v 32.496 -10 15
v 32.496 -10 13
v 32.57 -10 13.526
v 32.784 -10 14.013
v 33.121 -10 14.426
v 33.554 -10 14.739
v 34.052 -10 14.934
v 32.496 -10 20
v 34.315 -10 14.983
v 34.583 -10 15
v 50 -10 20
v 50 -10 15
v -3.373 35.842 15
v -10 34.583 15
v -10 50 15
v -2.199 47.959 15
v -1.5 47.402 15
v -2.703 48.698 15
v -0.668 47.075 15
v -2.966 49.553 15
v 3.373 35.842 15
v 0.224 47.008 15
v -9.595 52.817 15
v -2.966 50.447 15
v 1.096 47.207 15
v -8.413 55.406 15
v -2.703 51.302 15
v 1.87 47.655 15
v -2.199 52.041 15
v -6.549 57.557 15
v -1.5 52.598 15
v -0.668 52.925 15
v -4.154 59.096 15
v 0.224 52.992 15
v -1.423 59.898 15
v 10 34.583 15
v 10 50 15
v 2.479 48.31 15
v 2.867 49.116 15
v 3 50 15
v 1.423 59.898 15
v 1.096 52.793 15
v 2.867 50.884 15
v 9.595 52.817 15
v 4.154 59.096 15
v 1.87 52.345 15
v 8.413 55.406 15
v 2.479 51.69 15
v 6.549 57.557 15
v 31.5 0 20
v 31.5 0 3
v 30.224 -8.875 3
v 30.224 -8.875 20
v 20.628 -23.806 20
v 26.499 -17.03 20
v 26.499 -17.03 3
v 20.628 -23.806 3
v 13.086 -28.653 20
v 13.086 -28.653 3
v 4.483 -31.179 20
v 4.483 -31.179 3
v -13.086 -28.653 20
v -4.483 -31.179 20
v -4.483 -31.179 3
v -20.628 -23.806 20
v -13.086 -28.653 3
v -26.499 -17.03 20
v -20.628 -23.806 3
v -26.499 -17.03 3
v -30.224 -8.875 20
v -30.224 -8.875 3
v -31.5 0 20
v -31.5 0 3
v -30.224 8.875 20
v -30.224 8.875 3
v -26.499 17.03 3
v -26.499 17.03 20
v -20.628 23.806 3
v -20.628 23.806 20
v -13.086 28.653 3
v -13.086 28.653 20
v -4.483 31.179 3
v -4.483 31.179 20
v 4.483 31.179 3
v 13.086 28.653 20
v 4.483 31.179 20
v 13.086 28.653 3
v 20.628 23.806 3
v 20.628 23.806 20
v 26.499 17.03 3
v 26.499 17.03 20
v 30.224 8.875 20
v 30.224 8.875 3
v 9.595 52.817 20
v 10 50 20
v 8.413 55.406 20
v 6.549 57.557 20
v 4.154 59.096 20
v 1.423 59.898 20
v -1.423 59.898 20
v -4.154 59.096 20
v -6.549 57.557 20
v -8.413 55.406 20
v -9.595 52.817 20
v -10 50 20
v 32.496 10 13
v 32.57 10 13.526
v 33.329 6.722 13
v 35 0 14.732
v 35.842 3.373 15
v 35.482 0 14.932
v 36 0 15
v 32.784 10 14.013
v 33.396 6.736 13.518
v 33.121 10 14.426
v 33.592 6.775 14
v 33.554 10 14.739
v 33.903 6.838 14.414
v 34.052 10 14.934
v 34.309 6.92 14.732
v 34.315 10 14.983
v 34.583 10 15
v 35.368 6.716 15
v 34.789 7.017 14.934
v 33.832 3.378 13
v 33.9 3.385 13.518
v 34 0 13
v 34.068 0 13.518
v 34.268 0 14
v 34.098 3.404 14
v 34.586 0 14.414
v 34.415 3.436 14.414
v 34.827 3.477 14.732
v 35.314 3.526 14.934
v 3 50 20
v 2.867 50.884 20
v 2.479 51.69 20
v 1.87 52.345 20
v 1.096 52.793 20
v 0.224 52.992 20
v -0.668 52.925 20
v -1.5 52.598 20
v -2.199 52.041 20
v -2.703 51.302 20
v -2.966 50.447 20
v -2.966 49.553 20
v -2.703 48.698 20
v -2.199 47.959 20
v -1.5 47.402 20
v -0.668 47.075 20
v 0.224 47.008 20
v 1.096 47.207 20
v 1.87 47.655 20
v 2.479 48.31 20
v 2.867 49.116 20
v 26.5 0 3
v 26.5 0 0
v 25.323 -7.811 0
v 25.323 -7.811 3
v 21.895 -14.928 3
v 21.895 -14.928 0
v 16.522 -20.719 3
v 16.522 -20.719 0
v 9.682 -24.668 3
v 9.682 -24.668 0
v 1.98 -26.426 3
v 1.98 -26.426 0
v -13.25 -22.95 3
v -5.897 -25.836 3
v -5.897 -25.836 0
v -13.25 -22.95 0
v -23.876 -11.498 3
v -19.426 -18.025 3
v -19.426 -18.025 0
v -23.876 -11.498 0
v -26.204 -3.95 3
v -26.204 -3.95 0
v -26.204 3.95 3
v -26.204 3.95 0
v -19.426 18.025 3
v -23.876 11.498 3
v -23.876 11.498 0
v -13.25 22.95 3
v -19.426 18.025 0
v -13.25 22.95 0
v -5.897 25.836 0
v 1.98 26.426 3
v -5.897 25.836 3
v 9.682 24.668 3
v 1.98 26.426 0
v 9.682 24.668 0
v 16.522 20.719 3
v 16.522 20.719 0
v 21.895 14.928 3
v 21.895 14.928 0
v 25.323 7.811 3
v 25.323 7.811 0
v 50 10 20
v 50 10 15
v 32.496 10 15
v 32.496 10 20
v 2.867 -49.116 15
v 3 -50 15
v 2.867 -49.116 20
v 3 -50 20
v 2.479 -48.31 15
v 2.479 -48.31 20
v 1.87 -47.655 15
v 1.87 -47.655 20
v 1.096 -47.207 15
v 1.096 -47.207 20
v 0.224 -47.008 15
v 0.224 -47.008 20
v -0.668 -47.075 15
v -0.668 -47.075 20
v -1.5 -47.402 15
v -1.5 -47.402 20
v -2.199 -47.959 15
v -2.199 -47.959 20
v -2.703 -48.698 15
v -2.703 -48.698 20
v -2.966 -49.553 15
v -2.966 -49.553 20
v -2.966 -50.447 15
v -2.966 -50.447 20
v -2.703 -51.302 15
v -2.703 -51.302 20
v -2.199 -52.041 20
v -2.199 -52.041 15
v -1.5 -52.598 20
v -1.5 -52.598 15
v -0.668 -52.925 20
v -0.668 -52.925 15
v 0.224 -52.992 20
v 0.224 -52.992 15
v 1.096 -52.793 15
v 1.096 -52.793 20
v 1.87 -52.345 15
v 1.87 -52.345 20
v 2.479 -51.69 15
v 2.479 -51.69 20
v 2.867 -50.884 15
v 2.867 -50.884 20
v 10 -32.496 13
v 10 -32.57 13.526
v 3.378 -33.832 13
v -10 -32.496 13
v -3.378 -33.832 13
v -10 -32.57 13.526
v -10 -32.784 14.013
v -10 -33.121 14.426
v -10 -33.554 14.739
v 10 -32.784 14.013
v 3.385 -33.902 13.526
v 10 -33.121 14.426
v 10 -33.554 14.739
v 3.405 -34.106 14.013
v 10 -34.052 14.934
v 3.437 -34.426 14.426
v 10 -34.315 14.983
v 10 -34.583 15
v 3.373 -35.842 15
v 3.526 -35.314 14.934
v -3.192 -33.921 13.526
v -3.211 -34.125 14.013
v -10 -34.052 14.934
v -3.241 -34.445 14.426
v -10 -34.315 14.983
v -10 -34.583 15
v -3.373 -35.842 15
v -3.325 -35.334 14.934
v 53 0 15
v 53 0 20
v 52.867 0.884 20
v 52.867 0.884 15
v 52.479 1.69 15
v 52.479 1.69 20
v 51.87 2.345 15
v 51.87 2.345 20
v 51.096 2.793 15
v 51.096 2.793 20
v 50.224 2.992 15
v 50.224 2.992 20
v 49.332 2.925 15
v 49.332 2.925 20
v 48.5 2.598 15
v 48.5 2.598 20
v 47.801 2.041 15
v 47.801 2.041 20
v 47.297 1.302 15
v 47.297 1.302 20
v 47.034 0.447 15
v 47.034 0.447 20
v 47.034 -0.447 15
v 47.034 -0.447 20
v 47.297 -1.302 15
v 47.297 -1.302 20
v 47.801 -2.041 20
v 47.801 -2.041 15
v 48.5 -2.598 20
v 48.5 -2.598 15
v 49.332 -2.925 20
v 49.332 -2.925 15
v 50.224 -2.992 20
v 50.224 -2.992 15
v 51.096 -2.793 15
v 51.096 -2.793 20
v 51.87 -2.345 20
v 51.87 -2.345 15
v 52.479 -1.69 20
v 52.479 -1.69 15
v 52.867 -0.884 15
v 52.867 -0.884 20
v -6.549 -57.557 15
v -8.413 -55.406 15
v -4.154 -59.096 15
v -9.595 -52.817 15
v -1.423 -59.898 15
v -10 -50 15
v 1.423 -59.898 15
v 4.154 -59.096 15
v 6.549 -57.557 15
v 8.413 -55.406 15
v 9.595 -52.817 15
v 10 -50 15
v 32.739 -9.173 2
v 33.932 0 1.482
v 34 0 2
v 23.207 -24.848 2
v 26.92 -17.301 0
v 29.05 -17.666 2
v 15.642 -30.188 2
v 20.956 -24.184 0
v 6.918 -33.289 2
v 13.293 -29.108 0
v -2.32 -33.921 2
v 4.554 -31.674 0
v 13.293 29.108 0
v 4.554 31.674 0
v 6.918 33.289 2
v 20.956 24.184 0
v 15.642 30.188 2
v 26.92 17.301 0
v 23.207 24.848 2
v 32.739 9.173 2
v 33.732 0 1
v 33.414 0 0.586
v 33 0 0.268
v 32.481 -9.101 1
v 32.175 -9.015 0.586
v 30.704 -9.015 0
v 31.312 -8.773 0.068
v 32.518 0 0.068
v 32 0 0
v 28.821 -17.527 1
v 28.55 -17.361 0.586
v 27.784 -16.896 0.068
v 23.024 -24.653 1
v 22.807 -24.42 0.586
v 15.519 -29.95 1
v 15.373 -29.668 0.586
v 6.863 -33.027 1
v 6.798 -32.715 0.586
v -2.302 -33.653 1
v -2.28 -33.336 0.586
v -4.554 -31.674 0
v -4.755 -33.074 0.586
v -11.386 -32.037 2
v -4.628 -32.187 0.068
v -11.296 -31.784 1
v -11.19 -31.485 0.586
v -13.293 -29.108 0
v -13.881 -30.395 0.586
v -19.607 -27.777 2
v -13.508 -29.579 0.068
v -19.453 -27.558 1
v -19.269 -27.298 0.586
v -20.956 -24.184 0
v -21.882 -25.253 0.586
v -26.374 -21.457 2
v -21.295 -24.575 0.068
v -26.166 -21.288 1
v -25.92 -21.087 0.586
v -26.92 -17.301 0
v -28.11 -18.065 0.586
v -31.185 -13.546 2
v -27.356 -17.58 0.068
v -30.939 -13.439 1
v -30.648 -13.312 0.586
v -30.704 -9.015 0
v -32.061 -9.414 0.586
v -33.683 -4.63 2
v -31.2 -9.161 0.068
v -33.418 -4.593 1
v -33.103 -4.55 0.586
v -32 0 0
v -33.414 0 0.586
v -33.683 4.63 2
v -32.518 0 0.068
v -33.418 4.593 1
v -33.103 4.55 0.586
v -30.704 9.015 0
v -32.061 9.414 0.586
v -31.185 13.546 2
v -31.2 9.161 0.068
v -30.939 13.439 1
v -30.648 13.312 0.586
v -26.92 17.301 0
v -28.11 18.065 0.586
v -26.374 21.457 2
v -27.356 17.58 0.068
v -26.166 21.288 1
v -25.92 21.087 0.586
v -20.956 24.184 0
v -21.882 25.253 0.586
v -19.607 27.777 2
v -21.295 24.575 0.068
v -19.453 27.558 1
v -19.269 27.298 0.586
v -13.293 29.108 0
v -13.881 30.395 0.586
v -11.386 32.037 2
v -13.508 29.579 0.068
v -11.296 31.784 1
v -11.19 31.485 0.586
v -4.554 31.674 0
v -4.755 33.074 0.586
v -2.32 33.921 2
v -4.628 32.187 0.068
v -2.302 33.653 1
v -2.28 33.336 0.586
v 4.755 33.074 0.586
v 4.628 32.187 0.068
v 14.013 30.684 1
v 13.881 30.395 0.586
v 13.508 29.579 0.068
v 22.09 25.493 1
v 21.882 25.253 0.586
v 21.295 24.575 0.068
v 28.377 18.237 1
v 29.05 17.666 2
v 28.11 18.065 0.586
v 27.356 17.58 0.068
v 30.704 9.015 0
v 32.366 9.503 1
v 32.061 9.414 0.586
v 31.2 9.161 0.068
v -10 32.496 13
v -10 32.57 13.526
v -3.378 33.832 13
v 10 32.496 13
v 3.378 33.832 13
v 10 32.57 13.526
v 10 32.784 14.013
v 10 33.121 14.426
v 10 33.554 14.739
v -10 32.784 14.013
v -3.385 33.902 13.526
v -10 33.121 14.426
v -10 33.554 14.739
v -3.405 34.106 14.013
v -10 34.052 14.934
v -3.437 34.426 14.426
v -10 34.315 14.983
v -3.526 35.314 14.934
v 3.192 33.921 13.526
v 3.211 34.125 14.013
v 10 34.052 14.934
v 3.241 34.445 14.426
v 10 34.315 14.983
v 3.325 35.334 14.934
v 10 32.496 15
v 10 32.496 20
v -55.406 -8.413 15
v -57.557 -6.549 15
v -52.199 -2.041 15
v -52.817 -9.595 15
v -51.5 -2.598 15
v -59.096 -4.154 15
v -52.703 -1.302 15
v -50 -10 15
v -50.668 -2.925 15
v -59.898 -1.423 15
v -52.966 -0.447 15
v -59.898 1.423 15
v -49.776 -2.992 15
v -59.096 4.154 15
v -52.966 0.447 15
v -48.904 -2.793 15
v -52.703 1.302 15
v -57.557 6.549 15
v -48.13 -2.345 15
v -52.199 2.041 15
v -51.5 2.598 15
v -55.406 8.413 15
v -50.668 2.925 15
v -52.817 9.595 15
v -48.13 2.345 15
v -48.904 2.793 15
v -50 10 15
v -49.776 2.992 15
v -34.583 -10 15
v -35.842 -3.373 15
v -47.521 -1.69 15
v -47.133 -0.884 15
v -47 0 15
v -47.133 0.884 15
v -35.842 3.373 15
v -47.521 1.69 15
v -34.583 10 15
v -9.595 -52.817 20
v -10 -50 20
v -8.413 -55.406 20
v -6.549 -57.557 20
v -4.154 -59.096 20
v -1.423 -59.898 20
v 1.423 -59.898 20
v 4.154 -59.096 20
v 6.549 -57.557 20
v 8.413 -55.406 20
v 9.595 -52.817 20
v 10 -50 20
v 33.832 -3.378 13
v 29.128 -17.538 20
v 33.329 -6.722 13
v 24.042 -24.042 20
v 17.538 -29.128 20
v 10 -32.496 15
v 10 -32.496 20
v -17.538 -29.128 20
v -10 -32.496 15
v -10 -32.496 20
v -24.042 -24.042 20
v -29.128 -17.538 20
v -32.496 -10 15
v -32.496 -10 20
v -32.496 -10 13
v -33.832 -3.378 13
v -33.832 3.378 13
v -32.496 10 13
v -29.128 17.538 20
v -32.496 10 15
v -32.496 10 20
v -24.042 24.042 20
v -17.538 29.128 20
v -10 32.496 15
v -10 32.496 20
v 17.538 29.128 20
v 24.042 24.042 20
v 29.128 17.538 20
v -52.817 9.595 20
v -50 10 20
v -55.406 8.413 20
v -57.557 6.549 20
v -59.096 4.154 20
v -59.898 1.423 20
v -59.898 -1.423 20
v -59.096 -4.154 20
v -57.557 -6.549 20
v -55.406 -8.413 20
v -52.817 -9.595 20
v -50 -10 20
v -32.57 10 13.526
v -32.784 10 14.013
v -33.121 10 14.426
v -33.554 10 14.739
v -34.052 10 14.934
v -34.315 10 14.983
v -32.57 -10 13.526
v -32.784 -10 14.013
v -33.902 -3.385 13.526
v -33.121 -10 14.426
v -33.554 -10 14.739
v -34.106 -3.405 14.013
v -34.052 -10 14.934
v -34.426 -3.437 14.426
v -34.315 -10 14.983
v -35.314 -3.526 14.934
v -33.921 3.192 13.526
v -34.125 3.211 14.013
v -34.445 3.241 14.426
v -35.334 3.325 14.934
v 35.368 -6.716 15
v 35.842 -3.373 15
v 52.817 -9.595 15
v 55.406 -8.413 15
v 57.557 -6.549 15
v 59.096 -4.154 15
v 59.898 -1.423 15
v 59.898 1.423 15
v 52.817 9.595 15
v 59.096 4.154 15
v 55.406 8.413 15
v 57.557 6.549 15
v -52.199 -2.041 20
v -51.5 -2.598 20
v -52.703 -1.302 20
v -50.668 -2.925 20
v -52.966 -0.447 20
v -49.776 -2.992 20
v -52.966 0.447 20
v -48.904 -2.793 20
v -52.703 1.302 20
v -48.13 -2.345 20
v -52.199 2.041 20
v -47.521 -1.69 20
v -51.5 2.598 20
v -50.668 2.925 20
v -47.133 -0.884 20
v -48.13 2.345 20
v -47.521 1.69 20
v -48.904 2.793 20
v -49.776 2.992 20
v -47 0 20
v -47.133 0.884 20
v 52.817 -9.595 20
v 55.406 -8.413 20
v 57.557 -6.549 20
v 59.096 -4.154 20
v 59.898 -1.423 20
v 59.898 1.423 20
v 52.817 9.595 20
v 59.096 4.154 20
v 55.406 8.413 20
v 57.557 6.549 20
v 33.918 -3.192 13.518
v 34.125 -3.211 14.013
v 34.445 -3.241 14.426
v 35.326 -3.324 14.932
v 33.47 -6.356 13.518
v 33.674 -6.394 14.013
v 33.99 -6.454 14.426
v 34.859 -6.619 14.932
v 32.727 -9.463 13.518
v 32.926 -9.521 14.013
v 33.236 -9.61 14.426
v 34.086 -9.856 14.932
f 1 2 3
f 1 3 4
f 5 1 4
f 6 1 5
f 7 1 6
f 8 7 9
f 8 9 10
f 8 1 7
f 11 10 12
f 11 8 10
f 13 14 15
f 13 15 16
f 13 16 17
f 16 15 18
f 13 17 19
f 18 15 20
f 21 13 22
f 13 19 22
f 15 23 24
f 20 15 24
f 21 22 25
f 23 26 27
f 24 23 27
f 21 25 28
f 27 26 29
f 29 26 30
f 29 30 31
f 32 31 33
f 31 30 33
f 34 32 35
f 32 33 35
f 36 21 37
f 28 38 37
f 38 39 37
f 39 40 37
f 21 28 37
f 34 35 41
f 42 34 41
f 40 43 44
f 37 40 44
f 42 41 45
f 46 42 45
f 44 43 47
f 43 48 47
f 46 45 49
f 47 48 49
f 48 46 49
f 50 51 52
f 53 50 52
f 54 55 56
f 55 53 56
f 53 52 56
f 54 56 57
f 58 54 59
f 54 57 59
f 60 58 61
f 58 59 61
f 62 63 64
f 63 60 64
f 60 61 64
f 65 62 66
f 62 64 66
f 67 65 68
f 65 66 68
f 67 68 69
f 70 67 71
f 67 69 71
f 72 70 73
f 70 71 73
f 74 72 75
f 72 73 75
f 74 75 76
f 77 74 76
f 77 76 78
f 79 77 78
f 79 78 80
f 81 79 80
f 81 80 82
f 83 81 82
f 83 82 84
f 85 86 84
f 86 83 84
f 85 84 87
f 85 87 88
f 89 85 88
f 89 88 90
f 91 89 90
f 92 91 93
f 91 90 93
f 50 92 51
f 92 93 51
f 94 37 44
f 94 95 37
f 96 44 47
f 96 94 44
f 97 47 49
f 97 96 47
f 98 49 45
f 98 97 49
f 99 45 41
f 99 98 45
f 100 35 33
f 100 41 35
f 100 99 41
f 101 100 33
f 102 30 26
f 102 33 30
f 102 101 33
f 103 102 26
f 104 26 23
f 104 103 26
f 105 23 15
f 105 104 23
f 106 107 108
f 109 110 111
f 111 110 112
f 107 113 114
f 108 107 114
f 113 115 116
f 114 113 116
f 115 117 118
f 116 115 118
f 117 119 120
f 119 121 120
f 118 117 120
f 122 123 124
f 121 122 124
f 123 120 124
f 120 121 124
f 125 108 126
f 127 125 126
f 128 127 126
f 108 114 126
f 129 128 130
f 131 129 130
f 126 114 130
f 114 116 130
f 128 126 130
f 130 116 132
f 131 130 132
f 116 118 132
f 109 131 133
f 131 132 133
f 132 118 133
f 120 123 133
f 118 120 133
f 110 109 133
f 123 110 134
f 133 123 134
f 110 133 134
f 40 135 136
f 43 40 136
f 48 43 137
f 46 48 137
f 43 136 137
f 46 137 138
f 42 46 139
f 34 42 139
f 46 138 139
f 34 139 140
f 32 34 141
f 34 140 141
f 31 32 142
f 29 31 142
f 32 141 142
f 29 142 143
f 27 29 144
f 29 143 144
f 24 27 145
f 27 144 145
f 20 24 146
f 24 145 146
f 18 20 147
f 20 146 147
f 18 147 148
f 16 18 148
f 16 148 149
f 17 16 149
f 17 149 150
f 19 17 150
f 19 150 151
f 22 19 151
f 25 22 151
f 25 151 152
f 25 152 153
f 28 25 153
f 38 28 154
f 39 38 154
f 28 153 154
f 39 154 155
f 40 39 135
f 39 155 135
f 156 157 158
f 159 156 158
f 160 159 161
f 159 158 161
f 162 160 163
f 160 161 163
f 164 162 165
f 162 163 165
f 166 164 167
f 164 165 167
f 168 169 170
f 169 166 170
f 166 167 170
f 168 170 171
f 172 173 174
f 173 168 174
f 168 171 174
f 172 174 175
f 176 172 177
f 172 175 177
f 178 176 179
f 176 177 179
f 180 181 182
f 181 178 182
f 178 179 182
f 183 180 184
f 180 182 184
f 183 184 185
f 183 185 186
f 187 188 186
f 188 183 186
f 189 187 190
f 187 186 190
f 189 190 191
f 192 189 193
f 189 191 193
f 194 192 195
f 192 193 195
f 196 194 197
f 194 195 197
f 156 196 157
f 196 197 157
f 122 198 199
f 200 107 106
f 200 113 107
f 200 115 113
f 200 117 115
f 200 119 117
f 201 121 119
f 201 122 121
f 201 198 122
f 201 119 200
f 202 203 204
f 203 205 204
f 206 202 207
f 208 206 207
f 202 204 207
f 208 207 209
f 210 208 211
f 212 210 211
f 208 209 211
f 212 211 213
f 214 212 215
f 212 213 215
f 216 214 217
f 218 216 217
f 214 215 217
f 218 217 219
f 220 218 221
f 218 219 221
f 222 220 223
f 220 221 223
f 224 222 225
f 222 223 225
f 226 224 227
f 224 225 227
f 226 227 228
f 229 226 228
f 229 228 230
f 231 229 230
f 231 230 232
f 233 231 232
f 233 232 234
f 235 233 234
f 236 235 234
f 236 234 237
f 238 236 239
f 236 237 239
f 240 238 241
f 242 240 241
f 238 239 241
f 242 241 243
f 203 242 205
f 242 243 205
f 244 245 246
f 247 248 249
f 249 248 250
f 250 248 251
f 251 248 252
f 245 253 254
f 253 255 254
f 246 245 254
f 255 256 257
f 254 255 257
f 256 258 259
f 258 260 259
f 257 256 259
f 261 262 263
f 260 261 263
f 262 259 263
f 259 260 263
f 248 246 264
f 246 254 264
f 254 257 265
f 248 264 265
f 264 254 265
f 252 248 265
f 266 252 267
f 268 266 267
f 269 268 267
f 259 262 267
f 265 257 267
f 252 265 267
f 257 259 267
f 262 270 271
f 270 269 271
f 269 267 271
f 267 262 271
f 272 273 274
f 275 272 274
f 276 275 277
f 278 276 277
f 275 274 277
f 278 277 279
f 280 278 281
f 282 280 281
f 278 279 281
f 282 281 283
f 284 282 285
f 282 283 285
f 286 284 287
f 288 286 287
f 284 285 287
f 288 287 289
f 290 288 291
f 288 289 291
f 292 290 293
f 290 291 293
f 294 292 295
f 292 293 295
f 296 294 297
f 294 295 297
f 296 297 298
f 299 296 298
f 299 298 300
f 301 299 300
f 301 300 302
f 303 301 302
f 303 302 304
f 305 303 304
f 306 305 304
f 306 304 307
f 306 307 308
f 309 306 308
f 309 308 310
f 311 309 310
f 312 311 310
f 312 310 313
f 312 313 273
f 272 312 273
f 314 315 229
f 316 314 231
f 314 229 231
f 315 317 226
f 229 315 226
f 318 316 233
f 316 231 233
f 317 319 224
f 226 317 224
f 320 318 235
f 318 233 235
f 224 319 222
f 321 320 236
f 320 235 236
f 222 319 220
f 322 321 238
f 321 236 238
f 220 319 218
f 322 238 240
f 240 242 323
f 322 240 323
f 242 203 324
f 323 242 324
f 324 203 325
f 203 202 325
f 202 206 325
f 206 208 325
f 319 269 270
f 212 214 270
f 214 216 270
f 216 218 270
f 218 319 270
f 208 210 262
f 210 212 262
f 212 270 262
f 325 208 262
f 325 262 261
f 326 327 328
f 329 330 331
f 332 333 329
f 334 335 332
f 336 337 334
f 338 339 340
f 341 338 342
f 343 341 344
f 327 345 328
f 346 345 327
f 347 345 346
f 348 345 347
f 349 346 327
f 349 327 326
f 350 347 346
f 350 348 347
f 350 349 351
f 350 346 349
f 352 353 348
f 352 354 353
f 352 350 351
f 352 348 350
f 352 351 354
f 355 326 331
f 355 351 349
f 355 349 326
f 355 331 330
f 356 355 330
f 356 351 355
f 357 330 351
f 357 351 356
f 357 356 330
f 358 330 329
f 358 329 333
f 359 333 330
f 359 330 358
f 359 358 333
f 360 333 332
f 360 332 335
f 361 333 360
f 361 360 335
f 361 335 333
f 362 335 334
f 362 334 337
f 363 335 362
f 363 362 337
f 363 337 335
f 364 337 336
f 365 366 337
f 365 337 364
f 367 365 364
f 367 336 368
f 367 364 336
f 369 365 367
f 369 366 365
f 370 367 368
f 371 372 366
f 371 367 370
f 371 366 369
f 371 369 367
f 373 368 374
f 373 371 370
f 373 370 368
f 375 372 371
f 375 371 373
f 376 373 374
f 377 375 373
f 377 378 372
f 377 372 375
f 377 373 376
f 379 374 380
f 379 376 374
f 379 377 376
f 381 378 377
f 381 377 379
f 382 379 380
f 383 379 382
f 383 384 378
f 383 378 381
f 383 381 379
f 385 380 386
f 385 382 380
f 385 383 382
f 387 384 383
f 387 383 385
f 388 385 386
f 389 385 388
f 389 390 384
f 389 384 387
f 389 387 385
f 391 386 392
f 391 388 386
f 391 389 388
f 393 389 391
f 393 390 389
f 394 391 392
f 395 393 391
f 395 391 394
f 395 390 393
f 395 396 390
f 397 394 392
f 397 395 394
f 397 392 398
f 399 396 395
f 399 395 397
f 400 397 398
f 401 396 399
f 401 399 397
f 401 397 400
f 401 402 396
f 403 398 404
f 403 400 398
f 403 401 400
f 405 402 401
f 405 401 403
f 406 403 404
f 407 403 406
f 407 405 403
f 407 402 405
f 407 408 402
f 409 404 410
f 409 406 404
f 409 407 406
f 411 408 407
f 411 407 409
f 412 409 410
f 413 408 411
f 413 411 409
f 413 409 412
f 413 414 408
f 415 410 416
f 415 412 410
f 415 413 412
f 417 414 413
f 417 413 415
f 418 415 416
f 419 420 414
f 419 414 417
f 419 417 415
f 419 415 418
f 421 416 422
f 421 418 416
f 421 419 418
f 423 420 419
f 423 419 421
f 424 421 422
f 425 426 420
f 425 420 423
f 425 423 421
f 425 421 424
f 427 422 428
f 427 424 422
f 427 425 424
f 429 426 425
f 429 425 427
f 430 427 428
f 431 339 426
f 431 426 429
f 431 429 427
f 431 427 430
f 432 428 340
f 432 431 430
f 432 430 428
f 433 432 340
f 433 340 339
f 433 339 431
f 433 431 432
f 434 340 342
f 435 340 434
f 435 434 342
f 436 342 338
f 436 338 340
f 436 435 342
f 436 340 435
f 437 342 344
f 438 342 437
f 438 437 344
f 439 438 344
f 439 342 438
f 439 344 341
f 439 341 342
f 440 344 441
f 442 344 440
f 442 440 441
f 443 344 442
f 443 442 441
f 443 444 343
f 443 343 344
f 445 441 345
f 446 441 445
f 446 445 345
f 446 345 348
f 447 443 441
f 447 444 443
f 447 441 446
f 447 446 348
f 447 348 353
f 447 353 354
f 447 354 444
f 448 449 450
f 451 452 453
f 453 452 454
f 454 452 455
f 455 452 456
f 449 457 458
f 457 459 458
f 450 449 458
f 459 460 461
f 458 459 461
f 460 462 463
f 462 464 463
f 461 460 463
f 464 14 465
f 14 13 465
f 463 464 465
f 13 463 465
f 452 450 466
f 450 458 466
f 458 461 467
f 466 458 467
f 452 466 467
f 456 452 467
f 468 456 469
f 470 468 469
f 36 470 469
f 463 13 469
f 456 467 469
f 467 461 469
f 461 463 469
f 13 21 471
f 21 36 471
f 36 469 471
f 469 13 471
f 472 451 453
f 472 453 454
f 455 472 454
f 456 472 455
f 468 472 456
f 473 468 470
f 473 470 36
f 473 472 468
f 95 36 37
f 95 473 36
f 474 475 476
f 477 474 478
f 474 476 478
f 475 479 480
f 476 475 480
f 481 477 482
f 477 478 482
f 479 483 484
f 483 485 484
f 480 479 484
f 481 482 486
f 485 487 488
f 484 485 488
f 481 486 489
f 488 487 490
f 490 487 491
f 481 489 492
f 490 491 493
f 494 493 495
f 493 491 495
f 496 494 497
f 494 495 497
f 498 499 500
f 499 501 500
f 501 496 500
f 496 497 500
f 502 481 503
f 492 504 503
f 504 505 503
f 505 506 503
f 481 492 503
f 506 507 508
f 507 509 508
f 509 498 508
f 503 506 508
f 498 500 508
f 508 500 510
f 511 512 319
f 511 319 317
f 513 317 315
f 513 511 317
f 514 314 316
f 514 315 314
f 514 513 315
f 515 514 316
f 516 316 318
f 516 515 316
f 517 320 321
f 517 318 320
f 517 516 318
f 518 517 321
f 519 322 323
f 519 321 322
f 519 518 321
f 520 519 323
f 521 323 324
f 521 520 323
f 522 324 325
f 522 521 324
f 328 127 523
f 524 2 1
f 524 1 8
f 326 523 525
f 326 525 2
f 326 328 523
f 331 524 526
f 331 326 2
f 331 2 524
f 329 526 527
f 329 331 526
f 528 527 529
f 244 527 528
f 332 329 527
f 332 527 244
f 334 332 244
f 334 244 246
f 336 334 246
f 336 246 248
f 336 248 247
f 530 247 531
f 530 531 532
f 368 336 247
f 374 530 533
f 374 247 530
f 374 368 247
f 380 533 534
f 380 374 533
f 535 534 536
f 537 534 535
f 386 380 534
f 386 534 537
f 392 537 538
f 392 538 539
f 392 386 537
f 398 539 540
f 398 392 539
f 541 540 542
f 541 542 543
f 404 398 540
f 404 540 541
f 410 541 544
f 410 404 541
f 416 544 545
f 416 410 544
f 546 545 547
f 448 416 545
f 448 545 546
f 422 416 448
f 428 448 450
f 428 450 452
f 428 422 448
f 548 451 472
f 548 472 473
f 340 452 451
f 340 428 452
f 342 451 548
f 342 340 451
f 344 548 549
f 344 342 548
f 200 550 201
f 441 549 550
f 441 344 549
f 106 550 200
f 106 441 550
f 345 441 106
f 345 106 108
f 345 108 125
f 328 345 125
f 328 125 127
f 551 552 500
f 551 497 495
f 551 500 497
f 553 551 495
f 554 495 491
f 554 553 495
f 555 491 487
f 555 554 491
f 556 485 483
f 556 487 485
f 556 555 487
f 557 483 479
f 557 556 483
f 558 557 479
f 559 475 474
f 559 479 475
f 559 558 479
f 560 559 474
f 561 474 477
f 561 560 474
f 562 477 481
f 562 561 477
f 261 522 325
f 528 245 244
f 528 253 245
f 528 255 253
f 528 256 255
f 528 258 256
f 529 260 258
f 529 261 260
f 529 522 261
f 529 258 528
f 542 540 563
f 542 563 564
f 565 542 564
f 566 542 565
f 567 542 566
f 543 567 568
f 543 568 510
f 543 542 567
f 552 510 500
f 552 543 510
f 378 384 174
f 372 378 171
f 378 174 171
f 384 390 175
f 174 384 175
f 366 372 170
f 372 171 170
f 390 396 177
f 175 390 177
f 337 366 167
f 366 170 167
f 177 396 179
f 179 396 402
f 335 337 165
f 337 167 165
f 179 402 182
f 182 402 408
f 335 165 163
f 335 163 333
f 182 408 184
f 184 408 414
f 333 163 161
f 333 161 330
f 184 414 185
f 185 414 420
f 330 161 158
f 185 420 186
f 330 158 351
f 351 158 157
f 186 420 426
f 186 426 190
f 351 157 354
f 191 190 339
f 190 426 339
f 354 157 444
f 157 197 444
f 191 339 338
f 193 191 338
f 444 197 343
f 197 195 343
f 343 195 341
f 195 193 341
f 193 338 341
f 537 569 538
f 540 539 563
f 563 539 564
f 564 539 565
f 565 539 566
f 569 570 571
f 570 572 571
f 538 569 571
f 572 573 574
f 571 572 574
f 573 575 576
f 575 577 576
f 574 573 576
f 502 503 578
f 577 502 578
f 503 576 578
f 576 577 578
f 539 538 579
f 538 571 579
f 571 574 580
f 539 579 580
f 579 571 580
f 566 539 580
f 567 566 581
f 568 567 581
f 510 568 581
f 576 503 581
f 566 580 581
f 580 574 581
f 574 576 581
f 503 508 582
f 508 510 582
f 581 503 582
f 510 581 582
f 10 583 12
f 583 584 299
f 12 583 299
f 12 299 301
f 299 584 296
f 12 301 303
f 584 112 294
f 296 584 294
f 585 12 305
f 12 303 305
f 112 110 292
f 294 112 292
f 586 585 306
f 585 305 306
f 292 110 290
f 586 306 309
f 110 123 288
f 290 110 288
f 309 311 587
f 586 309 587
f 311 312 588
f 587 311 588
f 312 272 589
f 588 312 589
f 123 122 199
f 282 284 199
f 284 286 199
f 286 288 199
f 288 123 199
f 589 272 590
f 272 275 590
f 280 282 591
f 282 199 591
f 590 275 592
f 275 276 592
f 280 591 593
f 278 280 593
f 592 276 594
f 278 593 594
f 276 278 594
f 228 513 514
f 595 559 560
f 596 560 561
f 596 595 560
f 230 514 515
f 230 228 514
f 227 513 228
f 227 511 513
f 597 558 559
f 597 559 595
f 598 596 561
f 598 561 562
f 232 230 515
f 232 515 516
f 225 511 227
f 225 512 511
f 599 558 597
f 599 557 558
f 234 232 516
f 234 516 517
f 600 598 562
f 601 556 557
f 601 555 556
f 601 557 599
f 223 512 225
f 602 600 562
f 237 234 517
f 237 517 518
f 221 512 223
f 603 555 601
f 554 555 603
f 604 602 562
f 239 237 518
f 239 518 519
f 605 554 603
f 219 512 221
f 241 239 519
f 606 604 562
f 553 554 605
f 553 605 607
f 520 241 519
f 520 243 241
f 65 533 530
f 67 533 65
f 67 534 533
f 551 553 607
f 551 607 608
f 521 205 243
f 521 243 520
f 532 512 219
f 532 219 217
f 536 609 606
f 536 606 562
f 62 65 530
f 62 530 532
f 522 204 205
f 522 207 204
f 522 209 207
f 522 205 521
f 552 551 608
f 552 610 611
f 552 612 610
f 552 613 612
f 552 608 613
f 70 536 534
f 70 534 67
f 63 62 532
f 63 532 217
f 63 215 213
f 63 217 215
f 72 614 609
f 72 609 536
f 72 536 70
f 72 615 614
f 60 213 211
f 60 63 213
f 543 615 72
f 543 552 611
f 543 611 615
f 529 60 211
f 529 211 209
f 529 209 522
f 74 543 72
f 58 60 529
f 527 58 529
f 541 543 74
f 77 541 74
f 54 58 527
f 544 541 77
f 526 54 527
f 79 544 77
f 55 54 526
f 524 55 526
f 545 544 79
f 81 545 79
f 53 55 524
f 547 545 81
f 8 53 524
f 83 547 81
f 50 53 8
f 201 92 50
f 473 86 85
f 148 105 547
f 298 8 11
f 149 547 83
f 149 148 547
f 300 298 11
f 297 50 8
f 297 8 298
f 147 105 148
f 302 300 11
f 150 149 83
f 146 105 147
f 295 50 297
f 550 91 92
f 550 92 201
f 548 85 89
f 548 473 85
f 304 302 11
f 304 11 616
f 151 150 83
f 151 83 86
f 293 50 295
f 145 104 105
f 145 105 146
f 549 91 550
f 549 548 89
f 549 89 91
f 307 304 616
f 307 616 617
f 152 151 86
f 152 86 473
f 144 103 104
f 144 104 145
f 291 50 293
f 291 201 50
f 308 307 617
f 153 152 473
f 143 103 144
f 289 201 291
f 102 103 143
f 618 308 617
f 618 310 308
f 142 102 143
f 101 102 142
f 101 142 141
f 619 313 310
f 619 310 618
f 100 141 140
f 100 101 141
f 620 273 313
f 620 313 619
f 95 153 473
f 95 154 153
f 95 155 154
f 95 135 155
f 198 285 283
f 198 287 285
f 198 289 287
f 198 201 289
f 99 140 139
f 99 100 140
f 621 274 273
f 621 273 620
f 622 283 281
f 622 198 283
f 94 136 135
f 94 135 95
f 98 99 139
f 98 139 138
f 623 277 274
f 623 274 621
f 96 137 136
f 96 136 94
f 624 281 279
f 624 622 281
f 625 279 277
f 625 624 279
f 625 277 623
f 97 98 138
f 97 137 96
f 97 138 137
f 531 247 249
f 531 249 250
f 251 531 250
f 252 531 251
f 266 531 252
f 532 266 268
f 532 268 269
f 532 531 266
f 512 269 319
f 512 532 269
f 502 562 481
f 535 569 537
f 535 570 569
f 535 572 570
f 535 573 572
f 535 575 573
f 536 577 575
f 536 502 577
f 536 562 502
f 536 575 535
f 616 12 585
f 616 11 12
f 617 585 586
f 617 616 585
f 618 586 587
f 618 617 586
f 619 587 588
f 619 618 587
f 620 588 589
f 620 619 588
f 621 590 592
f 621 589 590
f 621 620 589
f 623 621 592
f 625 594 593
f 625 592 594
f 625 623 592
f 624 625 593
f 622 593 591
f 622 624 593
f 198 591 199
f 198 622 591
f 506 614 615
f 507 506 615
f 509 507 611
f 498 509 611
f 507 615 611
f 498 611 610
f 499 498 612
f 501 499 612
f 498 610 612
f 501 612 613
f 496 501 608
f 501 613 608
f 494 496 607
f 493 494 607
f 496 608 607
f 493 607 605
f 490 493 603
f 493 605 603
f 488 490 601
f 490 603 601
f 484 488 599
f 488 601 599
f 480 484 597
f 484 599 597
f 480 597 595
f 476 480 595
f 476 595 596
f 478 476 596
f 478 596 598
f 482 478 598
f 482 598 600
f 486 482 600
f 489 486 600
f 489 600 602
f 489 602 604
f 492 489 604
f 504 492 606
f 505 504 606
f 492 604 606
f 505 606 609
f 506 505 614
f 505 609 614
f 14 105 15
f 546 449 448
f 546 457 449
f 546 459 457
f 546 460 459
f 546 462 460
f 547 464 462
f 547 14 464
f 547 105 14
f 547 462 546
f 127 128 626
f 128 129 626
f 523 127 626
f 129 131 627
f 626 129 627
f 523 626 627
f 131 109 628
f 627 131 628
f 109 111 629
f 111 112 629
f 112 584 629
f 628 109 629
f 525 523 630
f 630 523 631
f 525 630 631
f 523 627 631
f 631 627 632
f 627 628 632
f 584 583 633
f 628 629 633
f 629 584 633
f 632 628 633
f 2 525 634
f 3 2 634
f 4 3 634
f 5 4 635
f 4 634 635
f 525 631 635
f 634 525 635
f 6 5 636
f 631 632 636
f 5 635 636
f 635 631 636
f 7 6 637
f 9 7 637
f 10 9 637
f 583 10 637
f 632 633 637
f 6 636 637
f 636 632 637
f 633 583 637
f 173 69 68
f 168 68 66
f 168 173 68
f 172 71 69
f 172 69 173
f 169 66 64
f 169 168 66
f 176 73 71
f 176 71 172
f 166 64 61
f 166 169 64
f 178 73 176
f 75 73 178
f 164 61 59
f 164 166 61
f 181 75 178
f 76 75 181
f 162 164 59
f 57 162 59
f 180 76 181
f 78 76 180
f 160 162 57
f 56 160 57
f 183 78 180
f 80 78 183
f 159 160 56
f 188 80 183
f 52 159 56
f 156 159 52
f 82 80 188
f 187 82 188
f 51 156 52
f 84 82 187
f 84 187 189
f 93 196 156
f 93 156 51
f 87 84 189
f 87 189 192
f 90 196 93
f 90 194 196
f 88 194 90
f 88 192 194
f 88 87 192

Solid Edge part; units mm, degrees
sketch "Sketch1" plane through (0, 0, 0) normal (0, 0, 1) x (1, 0, 0)
  circle A0 centre (0, 0) radius 26.5
  circle A1 centre (0, 0) radius 34
extrude "Protrusion1" add sketch "Sketch1" along normal blind 3
sketch "Sketch2" plane through (0, 0, 3) normal (0, 0, 1) x (1, 0, 0)
  circle A0 centre (0, 0) radius 31.5
  circle A1 centre (0, 0) radius 34
extrude "ExtrudedProtrusion_2" add sketch "Sketch2" along normal blind 17
fillet "Round_1" radius 2 1 edges at (-34, 0, 0)
sketch "Sketch3" plane through (0, 0, 20) normal (0, 0, 1) x (1, 0, 0)
  line L0 (10, 32.4962) -> (10, 50)
  line L1 (-10, 50) -> (-10, 32.4962)
  arc A0 (-10, 32.4962) -> (10, 32.4962) centre (0, 0) cw
  arc A1 (-10, 50) -> (10, 50) centre (0, 50) cw
  circle A2 centre (0, 50) radius 3
  line L2 (50, 10) -> (32.4962, 10)
  arc A3 (32.4962, 10) -> (32.4962, -10) centre (0, 0) cw
  line L3 (32.4962, -10) -> (50, -10)
  arc A4 (50, 10) -> (50, -10) centre (50, 0) cw
  circle A5 centre (50, 0) radius 3
  circle A6 centre (0, -50) radius 3
  line L4 (-10, -32.4962) -> (-10, -50)
  line L5 (10, -50) -> (10, -32.4962)
  arc A7 (10, -50) -> (-10, -50) centre (0, -50) cw
  arc A8 (10, -32.4962) -> (-10, -32.4962) centre (0, 0) cw
  line L6 (-50, -10) -> (-32.4962, -10)
  arc A9 (-32.4962, -10) -> (-32.4962, 10) centre (0, 0) cw
  line L7 (-32.4962, 10) -> (-50, 10)
  arc A10 (-50, -10) -> (-50, 10) centre (-50, 0) cw
  circle A11 centre (-50, 0) radius 3
extrude "ExtrudedProtrusion_3" add sketch "Sketch3" against normal blind 5
fillet "Round_2" radius 2 4 edges at (34, 0, 15) (0, -34, 15) (-34, 0, 15) (0, 34, 15)
properties material "ABS, alto impacto"
